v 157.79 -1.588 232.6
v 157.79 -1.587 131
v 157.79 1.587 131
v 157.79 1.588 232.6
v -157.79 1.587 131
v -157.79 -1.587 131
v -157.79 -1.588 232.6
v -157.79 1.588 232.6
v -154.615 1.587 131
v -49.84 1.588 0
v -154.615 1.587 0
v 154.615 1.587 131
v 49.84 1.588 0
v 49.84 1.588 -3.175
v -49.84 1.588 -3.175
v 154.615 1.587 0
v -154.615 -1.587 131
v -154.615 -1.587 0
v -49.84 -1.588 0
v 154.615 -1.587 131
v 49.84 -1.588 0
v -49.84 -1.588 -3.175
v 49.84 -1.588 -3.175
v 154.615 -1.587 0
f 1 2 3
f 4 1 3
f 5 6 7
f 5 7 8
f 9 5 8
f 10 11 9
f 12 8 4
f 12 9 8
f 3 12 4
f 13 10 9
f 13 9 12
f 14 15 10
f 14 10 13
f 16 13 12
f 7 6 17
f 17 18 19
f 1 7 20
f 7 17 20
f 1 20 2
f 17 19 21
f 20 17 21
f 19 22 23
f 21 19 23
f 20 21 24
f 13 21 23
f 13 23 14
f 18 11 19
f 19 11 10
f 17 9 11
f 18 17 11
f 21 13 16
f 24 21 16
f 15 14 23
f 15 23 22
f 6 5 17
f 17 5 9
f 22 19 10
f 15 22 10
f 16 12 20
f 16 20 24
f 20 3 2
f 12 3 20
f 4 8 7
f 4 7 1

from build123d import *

# Parameters (mm, degrees)
SKETCH1_W           = 315.58
SKETCH1_H           = 3.175
BOSS_EXTRUDE1_DEPTH = 232.600000128
SKETCH5_W           = 3.175
SKETCH5_H           = 130.999992
CUT_EXTRUDE2_DEPTH  = 282.088108579
SKETCH8_W           = 99.68
SKETCH8_H           = 3.175
BOSS_EXTRUDE2_DEPTH = 3.175


with BuildPart() as part:
    # Sketch1 → Boss-Extrude1 (new body)
    with BuildSketch(Plane.XY):
        Rectangle(SKETCH1_W, SKETCH1_H)
    extrude(amount=BOSS_EXTRUDE1_DEPTH)

    # Sketch5 → Cut-Extrude2 (cut, symmetric)
    with BuildSketch(Plane(origin=(0, 1.5875, 0), x_dir=(1, 0, 0), z_dir=(0, 1, 0))):
        with Locations((-156.2025, -65.499996)):
            Rectangle(SKETCH5_W, SKETCH5_H)
    cut_extrude2 = extrude(amount=CUT_EXTRUDE2_DEPTH, both=True, mode=Mode.SUBTRACT)

    # Mirror1: Cut-Extrude2 across plane
    add(cut_extrude2.mirror(Plane(origin=(0, 0, 0), x_dir=(0, 0, 1), z_dir=(1, 0, 0))), mode=Mode.SUBTRACT)

    # Sketch8 → Boss-Extrude2 (add)
    with BuildSketch(Plane(origin=(0, 0, 0), x_dir=(-1, 0, 0), z_dir=(0, 0, -1))):
        Rectangle(SKETCH8_W, SKETCH8_H)
    extrude(amount=BOSS_EXTRUDE2_DEPTH)


solid = part.part
